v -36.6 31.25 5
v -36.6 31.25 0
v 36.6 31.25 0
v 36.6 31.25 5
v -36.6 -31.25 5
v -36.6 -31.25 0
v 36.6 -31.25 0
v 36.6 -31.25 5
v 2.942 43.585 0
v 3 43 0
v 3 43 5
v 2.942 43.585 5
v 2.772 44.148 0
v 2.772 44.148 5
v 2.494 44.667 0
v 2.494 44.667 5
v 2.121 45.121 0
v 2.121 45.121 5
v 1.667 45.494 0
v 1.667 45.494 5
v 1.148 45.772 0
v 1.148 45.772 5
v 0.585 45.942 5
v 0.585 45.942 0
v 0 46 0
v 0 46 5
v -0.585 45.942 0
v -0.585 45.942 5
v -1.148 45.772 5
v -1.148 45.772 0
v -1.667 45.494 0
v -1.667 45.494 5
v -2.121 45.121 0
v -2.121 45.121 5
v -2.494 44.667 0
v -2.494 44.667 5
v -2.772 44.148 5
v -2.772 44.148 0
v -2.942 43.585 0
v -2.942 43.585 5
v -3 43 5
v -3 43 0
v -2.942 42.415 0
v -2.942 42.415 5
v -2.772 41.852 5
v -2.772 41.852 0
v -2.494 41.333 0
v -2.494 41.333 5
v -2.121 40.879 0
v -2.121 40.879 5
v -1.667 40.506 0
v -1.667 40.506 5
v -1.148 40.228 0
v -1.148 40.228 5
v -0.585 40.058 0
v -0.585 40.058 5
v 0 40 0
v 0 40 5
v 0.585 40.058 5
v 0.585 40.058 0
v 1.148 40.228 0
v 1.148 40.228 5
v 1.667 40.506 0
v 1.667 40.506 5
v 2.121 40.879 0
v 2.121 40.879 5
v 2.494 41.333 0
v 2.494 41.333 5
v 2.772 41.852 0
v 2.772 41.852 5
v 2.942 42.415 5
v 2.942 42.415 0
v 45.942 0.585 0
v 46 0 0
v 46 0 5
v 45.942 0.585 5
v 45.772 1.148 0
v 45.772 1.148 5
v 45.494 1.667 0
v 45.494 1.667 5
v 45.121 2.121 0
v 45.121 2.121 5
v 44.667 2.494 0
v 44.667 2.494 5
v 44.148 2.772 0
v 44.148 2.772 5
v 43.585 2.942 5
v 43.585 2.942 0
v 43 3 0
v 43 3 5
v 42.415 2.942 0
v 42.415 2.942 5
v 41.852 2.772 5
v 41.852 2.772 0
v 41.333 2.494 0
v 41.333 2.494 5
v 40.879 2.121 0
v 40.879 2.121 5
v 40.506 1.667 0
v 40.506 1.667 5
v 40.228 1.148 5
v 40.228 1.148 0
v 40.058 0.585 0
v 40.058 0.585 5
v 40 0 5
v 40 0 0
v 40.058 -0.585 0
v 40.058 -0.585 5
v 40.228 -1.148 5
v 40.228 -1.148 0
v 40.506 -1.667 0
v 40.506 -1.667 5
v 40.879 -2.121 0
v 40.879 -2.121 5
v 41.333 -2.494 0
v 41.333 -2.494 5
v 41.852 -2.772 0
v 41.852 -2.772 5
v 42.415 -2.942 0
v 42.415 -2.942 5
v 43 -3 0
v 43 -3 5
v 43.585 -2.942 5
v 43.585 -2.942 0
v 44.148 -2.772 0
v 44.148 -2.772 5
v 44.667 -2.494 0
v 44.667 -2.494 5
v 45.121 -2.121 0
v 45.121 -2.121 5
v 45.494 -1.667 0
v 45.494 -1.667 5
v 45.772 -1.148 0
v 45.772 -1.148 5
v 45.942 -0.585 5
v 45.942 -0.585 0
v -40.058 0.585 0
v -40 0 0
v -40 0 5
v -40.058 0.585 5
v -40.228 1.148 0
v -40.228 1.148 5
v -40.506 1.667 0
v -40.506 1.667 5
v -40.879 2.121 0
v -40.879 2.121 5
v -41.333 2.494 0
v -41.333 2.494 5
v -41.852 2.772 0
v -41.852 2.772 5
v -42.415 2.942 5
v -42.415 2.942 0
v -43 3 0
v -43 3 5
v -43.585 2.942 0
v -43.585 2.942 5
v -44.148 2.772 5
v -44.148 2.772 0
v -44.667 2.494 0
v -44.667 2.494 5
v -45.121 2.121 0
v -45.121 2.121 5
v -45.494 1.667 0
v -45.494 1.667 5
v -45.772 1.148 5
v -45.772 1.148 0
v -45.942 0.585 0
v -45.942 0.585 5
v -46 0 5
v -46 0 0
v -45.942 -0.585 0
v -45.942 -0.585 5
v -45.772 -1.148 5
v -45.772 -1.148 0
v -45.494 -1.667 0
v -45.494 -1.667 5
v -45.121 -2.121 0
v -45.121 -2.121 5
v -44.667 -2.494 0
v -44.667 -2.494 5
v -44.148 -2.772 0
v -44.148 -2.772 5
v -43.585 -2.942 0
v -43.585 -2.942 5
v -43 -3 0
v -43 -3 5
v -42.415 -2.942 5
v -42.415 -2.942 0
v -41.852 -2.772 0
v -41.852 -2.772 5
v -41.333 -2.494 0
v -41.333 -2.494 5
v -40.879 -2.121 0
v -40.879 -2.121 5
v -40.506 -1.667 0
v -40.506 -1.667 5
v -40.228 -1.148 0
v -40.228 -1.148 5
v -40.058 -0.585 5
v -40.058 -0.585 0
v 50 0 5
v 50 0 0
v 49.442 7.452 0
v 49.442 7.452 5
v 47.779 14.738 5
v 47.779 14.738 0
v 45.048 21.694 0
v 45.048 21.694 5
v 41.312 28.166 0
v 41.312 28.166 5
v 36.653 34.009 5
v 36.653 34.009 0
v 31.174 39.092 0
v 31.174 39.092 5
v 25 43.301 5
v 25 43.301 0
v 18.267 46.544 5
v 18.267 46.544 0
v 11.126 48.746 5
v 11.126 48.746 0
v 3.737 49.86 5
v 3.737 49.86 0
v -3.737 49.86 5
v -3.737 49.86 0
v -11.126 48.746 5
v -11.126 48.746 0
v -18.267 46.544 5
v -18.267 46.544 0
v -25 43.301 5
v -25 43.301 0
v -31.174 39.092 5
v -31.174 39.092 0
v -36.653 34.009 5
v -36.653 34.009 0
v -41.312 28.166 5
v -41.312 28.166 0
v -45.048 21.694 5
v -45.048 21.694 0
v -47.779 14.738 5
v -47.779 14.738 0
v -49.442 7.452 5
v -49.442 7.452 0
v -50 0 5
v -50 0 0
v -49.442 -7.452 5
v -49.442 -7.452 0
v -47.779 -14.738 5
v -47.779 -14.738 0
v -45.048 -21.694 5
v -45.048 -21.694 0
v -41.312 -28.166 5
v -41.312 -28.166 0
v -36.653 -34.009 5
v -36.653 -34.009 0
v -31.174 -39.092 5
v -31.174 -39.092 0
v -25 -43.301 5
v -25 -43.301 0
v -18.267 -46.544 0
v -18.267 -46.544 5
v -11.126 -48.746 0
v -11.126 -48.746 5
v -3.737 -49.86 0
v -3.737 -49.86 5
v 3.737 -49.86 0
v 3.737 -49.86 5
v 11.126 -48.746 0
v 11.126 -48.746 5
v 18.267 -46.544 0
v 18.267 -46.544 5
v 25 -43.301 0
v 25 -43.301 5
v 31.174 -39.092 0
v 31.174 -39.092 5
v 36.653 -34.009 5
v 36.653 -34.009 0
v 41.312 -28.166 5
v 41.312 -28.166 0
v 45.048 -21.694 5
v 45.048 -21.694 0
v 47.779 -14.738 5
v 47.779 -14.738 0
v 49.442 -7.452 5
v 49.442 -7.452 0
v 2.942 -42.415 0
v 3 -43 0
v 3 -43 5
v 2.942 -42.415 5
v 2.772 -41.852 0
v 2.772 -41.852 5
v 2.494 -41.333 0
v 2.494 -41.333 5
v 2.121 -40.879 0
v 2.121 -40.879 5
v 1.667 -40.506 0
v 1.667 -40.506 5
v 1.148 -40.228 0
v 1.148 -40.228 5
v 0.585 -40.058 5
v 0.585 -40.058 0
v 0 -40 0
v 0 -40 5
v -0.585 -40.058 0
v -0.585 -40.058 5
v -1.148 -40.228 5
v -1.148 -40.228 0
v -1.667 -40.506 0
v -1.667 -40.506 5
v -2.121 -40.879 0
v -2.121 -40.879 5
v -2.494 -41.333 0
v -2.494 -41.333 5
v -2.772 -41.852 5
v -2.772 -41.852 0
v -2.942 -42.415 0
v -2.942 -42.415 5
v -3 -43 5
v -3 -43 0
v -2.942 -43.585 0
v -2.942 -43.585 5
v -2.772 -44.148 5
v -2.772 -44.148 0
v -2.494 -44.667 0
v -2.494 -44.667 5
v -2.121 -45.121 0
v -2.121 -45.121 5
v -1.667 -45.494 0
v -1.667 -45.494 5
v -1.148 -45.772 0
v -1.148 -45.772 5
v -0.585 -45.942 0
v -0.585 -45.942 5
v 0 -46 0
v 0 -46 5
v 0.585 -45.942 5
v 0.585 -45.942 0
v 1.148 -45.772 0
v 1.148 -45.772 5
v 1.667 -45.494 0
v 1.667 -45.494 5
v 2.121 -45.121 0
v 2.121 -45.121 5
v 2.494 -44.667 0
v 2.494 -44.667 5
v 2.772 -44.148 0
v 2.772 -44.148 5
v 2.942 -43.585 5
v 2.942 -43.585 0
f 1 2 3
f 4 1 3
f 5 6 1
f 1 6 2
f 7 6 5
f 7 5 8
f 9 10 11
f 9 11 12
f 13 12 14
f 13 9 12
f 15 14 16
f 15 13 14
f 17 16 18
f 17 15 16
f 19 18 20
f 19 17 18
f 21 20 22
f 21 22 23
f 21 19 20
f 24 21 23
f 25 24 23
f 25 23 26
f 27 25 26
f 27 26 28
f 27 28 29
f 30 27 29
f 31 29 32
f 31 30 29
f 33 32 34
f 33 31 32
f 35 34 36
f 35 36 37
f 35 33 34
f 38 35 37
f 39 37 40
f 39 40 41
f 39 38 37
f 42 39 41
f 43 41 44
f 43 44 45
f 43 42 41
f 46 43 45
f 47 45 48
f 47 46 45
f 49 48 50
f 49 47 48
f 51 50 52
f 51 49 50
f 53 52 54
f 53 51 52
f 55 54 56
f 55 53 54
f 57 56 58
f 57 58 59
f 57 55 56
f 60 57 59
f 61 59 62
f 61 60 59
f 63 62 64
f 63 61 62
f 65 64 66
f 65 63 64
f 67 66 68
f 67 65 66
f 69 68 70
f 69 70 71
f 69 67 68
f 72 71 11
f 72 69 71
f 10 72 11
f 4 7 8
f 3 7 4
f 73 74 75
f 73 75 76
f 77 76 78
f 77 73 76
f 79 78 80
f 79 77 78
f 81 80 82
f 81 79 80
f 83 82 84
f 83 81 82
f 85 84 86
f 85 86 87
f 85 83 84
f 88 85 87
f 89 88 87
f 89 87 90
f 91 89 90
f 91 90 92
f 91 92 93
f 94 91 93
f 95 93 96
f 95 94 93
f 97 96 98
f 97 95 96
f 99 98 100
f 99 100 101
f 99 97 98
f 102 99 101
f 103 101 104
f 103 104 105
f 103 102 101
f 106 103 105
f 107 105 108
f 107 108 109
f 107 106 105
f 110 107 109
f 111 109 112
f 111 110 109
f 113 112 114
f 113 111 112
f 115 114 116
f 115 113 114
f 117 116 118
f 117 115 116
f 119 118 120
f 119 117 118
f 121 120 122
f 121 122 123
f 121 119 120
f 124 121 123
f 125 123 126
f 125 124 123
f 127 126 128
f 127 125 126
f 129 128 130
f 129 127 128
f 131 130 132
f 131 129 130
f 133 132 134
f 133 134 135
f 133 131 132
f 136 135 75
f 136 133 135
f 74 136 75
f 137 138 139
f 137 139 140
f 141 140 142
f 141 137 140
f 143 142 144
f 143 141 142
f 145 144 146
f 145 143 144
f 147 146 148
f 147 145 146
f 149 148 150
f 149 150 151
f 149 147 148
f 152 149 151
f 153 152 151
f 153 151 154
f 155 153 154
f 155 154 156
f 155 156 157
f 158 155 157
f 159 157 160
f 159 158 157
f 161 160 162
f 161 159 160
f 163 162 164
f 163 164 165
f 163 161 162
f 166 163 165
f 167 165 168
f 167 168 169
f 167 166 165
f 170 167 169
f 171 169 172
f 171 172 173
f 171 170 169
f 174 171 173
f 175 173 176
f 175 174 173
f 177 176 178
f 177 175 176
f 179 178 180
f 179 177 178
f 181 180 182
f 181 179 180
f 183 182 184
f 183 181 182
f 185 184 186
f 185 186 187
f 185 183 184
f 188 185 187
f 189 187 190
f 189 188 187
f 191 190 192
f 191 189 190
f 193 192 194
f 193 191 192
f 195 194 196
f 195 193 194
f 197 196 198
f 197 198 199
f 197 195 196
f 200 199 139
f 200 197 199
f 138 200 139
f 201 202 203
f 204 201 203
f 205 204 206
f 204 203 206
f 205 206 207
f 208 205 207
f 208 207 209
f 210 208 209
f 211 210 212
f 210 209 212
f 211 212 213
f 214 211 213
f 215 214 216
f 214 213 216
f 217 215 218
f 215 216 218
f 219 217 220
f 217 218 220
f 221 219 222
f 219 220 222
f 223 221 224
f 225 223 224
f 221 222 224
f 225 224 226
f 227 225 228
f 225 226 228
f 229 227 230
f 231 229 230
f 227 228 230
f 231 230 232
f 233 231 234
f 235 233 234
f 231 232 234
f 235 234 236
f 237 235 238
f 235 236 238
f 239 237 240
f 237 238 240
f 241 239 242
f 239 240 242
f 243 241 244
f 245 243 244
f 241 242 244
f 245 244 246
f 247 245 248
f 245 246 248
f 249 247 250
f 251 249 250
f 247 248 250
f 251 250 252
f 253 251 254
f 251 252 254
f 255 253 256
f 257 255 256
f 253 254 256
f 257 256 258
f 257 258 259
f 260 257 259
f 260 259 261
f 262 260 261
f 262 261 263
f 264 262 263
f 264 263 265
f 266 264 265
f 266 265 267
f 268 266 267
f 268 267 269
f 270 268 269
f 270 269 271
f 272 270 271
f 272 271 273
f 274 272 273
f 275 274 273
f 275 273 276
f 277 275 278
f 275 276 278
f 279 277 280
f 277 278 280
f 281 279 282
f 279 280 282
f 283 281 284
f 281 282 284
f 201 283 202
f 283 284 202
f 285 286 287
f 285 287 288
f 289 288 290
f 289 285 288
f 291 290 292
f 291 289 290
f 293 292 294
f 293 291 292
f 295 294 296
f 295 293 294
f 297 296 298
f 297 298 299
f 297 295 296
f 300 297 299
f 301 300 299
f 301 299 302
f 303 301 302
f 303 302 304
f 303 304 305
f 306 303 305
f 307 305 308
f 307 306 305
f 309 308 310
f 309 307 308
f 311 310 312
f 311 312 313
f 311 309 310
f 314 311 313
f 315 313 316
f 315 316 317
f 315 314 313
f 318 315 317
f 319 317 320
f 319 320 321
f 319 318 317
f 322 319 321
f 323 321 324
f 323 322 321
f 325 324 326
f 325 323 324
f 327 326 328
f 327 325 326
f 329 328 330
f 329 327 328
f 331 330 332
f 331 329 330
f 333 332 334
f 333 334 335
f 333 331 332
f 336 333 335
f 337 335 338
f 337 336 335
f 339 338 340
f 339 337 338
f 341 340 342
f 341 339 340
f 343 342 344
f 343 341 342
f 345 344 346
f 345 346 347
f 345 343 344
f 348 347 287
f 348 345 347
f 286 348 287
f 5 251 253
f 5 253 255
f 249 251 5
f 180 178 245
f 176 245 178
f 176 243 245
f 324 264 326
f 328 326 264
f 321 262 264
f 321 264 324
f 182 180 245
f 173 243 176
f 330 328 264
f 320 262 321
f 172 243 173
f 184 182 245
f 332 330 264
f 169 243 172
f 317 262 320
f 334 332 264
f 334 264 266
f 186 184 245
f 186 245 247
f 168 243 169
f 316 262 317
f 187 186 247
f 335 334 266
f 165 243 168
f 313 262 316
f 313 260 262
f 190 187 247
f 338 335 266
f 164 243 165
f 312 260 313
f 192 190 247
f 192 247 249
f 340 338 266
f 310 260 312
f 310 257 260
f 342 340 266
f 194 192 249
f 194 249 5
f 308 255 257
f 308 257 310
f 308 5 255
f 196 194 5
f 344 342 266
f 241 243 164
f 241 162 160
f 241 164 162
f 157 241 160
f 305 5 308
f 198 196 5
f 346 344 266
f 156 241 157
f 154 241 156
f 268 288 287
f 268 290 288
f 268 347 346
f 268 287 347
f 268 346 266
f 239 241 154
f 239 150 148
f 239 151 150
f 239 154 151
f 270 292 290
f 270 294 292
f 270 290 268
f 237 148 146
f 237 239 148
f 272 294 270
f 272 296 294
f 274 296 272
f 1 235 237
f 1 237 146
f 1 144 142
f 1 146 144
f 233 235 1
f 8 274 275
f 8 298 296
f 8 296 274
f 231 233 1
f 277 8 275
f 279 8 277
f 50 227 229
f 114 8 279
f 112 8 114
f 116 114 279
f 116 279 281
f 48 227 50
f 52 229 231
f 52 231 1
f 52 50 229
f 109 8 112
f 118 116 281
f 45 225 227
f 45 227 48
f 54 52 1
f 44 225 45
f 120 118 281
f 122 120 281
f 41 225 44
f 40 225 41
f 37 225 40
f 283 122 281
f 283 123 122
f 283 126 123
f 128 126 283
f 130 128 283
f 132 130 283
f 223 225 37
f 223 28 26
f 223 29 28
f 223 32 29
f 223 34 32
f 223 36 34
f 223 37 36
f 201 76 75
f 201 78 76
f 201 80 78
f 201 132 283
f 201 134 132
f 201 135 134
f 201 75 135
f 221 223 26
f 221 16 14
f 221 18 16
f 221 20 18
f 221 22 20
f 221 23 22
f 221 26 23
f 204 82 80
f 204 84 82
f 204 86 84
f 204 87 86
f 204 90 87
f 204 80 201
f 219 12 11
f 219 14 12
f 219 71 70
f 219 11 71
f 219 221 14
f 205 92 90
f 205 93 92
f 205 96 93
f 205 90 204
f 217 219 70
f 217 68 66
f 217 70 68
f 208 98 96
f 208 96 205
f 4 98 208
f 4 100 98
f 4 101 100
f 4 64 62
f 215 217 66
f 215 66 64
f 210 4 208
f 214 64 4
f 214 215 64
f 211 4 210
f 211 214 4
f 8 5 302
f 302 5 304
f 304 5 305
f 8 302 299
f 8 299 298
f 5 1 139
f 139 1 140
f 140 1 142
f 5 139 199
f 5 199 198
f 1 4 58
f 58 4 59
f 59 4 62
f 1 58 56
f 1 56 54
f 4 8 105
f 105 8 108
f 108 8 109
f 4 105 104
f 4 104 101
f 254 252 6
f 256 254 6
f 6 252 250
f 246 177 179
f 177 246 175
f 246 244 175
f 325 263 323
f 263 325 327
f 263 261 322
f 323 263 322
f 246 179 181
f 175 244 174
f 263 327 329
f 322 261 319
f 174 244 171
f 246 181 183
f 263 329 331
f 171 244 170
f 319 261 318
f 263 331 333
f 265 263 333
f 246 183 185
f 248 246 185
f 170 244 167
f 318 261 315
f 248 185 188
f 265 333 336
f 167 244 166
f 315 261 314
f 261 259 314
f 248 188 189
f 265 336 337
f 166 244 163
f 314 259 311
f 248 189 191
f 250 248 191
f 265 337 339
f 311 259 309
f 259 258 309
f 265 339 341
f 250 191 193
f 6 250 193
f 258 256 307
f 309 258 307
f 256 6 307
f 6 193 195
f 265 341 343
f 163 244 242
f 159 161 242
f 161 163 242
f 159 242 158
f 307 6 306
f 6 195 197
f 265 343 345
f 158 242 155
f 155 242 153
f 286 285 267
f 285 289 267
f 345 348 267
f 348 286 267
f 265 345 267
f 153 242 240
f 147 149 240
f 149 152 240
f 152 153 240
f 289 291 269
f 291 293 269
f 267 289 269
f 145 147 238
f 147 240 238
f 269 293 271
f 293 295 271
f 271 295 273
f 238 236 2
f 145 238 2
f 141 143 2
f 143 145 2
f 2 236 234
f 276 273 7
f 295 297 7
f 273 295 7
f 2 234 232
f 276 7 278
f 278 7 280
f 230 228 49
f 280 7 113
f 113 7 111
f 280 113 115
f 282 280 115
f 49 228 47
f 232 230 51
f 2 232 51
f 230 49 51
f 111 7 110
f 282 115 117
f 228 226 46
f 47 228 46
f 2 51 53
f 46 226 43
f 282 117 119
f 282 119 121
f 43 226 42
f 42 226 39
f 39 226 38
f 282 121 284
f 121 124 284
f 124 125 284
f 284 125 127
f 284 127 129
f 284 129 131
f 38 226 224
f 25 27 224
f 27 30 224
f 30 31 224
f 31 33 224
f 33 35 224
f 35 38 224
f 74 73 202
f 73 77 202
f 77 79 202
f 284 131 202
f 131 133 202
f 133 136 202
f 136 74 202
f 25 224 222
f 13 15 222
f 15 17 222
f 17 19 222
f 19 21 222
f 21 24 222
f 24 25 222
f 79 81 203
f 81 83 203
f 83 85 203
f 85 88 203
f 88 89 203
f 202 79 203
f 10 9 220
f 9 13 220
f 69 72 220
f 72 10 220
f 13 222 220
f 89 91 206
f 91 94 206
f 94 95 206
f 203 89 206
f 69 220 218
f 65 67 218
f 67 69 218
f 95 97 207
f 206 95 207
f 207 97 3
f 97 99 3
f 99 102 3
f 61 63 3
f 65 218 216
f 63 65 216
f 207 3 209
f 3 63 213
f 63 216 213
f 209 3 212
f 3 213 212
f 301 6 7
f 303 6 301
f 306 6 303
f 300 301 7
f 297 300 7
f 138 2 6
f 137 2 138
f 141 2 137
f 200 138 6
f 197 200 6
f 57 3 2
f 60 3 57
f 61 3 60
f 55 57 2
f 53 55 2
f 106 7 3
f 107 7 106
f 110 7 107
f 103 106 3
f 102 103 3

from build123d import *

# Parameters (mm, degrees)
ESQUISSE1_R        = 50
ESQUISSE1_R_2      = 3
ESQUISSE1_W        = 73.2
ESQUISSE1_H        = 62.5
BOSS_EXTRU_1_DEPTH = 5


with BuildPart() as part:
    # Esquisse1 → Boss.-Extru.1 (new body)
    with BuildSketch(Plane.XY):
        Circle(ESQUISSE1_R)
        with Locations((43, 0)):
            Circle(ESQUISSE1_R_2, mode=Mode.SUBTRACT)
        with Locations((0, 43)):
            Circle(ESQUISSE1_R_2, mode=Mode.SUBTRACT)
        with Locations((-43, 0)):
            Circle(ESQUISSE1_R_2, mode=Mode.SUBTRACT)
        with Locations((0, -43)):
            Circle(ESQUISSE1_R_2, mode=Mode.SUBTRACT)
        Rectangle(ESQUISSE1_W, ESQUISSE1_H, mode=Mode.SUBTRACT)
    extrude(amount=BOSS_EXTRU_1_DEPTH)


solid = part.part
